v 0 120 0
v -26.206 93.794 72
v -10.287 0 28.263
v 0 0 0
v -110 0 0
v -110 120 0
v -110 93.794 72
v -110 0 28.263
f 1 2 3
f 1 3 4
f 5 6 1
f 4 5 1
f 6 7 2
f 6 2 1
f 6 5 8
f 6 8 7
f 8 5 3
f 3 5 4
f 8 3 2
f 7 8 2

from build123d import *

# Parameters (mm, degrees)
F0_W     = 110
F0_H     = 120
F1_DEPTH = 72
F3_DEPTH = 120
F5_DEPTH = 133
F7_DEPTH = 133


with BuildPart() as f1:
    # F0 (on Top) → F1 (new body)
    with BuildSketch(Plane.XY):
        with Locations((-55, 60)):
            Rectangle(F0_W, F0_H)
    extrude(amount=F1_DEPTH)

    # F2 (on face) → F3 (cut)
    with BuildSketch(Plane.XZ):
        Polygon((-26.205857, 72), (0, 0), (0, 72), align=None)
    extrude(amount=-F3_DEPTH, mode=Mode.SUBTRACT)

    # F4 (on Right) → F5 (cut)
    with BuildSketch(Plane.YZ):
        Polygon((120, 0), (120, 72), (93.794143, 72), align=None)
    extrude(amount=-F5_DEPTH, mode=Mode.SUBTRACT)

    # F6 (on Right) → F7 (cut)
    with BuildSketch(Plane.YZ):
        Polygon((0, 28.263073), (93.794143, 72), (0, 72), align=None)
    extrude(amount=-F7_DEPTH, mode=Mode.SUBTRACT)


solid = f1.part
